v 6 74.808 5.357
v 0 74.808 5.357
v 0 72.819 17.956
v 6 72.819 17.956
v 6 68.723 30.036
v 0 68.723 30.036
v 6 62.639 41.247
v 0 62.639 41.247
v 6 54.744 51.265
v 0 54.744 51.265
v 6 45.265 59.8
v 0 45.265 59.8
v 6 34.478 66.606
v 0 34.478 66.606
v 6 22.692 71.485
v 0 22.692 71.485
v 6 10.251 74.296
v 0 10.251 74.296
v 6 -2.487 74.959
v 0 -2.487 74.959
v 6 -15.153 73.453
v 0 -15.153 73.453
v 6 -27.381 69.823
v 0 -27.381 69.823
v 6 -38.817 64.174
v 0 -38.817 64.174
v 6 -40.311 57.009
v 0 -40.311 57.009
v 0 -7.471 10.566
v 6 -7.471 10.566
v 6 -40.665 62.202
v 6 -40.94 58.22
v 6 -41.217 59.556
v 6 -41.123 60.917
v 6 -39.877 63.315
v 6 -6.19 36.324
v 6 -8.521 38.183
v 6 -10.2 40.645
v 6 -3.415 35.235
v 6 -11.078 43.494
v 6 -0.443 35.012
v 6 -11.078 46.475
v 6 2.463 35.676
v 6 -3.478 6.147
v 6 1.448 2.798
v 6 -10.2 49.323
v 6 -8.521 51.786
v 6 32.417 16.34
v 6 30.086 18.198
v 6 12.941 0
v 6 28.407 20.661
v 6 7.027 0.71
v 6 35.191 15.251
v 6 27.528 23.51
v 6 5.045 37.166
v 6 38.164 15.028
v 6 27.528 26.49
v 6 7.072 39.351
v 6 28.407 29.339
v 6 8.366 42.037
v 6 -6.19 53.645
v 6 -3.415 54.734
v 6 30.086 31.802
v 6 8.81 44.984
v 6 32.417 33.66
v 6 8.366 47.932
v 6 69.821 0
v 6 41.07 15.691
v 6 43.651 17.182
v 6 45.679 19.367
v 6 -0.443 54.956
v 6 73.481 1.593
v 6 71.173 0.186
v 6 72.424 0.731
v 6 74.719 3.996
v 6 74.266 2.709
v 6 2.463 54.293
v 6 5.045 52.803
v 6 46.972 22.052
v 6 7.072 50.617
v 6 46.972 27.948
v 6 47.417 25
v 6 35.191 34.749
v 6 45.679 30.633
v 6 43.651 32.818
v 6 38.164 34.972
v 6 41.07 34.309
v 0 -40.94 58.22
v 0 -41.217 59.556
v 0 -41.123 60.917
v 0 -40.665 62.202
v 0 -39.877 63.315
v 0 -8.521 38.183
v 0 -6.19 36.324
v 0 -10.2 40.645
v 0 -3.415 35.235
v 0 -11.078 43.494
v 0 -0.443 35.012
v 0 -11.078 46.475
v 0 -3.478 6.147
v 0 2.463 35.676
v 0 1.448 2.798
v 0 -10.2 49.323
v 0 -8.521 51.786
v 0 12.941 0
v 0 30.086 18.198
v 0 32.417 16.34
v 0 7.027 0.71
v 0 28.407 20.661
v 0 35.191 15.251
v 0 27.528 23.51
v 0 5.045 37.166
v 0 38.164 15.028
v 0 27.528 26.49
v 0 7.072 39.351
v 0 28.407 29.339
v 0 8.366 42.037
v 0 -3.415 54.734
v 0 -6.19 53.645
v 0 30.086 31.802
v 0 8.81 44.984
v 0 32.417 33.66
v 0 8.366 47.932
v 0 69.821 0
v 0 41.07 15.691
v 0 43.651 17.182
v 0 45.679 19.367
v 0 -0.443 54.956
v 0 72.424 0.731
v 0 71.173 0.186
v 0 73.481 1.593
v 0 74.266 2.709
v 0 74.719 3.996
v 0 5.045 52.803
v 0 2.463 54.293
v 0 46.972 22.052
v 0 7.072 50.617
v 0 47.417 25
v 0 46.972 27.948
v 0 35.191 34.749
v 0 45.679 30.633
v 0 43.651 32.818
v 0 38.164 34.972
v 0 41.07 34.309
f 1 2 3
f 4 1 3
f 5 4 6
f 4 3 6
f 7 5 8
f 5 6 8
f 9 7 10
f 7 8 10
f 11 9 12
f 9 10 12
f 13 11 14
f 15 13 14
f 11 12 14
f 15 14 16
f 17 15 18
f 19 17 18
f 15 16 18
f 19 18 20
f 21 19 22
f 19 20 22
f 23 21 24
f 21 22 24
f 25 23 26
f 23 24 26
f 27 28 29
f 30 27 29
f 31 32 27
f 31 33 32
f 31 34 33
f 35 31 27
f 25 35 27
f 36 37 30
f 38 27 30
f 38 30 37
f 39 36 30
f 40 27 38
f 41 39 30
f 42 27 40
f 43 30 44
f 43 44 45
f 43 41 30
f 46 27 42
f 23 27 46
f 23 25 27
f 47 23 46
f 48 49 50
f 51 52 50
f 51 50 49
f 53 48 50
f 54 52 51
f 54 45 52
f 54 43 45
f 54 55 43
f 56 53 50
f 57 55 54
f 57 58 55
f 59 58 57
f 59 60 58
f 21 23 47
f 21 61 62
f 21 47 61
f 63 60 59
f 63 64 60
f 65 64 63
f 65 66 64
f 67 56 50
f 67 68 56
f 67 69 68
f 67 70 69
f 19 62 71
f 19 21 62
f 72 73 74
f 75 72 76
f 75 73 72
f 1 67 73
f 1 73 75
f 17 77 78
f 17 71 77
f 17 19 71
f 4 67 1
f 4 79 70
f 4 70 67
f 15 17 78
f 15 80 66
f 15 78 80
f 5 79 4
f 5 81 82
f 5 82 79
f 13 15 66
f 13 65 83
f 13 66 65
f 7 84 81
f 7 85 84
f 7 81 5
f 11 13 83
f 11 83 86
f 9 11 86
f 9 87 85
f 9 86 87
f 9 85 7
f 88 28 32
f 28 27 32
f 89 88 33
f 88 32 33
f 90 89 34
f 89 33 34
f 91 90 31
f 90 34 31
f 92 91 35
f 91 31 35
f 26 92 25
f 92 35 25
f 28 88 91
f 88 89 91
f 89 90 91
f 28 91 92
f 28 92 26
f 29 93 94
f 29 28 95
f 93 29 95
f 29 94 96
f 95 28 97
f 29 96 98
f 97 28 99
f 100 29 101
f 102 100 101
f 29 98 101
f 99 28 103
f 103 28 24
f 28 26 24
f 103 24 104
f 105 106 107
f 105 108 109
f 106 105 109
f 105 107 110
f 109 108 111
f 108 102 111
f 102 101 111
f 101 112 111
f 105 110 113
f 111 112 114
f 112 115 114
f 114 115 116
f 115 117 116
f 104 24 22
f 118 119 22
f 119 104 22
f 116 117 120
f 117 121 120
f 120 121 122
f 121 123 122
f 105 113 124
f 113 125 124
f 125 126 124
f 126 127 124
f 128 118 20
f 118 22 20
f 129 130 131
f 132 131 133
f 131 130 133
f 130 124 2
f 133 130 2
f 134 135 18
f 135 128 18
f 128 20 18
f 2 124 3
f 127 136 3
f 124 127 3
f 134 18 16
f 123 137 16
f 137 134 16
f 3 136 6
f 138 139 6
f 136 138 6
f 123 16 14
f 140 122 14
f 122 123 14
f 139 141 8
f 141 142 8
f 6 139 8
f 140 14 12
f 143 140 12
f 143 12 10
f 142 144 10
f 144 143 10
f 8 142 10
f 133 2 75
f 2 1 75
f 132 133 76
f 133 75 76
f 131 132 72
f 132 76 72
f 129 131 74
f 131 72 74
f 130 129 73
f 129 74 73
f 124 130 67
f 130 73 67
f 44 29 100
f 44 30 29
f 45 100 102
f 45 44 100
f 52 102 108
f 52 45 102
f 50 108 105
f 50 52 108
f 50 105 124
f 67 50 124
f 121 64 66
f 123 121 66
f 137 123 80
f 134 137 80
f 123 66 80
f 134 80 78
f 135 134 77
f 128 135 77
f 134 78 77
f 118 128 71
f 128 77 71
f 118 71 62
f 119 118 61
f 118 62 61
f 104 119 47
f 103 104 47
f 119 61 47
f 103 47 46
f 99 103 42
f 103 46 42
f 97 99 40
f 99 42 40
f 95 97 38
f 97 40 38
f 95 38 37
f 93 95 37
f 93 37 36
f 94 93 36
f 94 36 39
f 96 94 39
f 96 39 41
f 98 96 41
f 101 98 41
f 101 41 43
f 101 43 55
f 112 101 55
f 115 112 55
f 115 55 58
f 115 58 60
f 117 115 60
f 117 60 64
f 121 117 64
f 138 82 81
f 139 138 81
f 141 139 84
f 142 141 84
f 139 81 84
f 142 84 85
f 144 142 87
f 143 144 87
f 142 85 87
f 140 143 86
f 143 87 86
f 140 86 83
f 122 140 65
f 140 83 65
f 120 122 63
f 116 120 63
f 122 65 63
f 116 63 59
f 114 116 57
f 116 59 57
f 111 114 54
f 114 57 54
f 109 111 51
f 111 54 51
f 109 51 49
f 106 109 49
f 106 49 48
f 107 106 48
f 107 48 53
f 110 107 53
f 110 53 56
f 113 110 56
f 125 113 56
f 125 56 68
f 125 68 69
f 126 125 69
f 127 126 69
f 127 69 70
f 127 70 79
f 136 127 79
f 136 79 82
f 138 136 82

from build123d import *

# Parameters (mm, degrees)
F1_DEPTH = 6
F2_R     = 25
F3_R     = 5
F4_R     = 10
F5_DEPTH = 6.001


with BuildPart() as f1:
    # F0 (on Right) → F1 (new body)
    with BuildSketch(Plane.YZ):
        with BuildLine():
            Line((-43.301281, 61.237236), (0, 0))
            Line((0, 0), (75, 0))
            ThreePointArc((75, 0), (34.477557, 66.605541), (-43.301281, 61.237236))
        make_face()
    extrude(amount=F1_DEPTH)

    # F2
    f2_edges = [f1.edges().sort_by_distance(p)[0] for p in [
        (3, 0, 0),
    ]]
    fillet(f2_edges, radius=F2_R)

    # F3
    f3_edges = [f1.edges().sort_by_distance(p)[0] for p in [
        (3, -43.301281, 61.237236),
        (3, 75, 0),
    ]]
    fillet(f3_edges, radius=F3_R)

    # F4 (on face) → F5 (cut, through all)
    with BuildSketch(Plane.YZ.offset(6)):
        with Locations((-1.190063, 44.984261)):
            Circle(F4_R)
        with Locations((37.416574, 25)):
            Circle(F4_R)
    extrude(amount=-F5_DEPTH, mode=Mode.SUBTRACT)


solid = f1.part
